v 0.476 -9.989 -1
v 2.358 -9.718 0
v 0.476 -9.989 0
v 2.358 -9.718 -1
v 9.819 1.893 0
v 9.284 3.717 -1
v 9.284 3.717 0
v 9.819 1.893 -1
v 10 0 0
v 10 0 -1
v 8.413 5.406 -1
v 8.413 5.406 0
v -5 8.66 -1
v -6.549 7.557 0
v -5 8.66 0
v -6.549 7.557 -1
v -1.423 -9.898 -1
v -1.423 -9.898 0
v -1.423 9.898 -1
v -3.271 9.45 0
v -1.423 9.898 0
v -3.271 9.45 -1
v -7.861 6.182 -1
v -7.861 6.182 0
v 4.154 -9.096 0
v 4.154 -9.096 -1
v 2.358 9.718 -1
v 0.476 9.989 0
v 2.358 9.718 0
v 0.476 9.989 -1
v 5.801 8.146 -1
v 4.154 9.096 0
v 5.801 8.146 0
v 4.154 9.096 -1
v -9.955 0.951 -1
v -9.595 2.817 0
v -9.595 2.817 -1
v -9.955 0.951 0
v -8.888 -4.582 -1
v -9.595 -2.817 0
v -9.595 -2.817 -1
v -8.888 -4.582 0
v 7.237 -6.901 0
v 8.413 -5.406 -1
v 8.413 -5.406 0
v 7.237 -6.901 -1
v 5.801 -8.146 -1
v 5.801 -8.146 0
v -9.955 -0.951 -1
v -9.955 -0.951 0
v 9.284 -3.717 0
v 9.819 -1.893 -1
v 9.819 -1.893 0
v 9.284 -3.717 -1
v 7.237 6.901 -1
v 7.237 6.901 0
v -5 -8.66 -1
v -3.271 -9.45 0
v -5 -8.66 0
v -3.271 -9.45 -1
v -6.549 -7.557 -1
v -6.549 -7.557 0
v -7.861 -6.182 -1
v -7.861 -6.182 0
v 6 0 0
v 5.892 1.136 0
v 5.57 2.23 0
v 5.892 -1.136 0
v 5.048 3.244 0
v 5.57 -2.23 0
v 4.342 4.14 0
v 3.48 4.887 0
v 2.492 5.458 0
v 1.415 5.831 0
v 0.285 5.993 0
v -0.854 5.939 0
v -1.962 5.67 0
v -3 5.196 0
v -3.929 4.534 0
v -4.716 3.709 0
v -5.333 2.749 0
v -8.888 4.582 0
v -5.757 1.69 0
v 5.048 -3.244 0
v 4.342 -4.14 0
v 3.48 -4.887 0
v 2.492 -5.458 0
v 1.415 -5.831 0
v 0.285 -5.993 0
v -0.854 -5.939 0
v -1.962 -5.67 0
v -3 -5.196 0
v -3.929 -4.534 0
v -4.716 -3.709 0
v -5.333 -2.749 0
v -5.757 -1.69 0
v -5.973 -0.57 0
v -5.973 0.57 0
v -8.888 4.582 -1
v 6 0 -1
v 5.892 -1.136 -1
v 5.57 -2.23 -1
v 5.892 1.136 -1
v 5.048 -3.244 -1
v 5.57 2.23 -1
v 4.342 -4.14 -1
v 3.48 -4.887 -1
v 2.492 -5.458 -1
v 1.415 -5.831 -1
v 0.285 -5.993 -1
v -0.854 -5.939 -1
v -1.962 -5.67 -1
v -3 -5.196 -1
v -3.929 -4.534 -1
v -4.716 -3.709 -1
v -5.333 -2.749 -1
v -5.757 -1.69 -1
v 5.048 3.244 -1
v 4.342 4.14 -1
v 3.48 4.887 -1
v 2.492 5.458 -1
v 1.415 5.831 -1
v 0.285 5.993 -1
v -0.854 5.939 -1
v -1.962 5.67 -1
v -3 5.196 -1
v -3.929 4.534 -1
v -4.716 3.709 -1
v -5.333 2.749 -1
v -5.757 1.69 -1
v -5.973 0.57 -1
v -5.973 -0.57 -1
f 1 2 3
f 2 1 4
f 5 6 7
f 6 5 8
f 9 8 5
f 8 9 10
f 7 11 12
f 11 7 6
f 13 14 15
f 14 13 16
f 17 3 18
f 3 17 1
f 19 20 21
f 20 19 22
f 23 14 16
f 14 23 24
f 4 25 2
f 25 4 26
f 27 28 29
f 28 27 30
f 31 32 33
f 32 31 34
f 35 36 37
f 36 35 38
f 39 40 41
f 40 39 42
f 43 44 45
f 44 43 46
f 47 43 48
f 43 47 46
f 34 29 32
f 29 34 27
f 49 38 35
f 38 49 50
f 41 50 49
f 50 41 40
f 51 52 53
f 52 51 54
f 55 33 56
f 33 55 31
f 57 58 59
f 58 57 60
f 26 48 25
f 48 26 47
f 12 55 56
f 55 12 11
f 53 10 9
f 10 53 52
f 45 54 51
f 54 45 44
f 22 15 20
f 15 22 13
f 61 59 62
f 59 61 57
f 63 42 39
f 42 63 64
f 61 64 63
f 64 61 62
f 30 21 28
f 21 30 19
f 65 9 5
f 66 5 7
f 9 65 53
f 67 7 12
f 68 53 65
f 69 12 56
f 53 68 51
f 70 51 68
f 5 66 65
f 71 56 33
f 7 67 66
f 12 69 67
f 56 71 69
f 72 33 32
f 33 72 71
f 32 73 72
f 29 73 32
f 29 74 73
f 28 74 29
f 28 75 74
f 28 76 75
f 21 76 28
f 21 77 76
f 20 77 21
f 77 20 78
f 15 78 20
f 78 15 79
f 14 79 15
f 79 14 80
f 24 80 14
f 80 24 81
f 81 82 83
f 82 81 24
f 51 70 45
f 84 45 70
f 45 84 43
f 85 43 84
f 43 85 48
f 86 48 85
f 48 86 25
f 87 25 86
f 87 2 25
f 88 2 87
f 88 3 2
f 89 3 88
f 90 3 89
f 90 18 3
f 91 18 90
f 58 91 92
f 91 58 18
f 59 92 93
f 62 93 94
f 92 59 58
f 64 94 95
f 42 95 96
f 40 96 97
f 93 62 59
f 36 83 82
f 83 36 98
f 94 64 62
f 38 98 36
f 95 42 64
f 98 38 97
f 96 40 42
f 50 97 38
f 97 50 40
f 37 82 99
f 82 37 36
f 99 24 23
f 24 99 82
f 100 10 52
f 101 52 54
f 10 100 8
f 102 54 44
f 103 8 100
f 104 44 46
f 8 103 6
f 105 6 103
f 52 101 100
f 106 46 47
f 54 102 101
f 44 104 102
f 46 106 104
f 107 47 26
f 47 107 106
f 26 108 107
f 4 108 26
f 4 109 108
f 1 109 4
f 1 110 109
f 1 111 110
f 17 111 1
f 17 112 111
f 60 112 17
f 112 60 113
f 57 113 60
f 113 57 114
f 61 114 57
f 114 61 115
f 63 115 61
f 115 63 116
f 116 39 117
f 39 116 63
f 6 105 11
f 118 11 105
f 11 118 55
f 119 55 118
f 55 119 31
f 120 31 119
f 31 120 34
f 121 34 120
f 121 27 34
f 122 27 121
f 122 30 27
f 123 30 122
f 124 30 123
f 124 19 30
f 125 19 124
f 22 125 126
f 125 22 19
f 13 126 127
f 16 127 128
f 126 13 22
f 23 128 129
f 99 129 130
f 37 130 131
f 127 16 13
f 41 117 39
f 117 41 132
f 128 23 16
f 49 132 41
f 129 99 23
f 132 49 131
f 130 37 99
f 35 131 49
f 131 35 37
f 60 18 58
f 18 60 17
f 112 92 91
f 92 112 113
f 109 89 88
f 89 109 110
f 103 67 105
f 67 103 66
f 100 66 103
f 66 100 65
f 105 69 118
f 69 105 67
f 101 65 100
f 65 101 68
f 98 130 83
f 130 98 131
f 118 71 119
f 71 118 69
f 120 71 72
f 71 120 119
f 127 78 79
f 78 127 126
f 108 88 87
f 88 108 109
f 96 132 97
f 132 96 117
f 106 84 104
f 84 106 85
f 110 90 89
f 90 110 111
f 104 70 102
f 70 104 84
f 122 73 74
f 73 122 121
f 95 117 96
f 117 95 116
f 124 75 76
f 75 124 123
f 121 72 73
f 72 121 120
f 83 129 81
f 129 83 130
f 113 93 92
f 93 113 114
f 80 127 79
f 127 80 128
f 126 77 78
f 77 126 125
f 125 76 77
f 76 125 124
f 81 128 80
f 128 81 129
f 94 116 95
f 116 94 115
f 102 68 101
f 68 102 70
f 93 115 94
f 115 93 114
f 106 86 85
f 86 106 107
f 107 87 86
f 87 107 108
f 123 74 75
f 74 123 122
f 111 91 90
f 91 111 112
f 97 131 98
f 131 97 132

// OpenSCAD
//======================================================================
// interlock.scad
//
// Parametric interlocking tabs
//
// DrTomFlint, 19 Oct 2024
//======================================================================


//----------------------------------------------------------------------
module lockRing(rout=10,rin=6,thick=2,upper=1,lower=1,f=33){

$fn=f;

if(upper==1){
  // boss
  difference(){
    cylinder(r=rout,h=thick/2);
    cylinder(r=rin,h=thick+1,center=true);
  }
}


if(lower==1){

  difference(){
    // boss
    difference(){
      translate([0,0,-thick/2])
      cylinder(r=rout,h=thick/2);
      cylinder(r=rin,h=thick+1,center=true);
    }
  }

}



}



//======================================================================

pan=0;

//~ lockRing(rout=10,rin=6,thick=2,lower=0);

rotate([0,0,pan])
lockRing(rout=10,rin=6,thick=2,upper=0);

//======================================================================
